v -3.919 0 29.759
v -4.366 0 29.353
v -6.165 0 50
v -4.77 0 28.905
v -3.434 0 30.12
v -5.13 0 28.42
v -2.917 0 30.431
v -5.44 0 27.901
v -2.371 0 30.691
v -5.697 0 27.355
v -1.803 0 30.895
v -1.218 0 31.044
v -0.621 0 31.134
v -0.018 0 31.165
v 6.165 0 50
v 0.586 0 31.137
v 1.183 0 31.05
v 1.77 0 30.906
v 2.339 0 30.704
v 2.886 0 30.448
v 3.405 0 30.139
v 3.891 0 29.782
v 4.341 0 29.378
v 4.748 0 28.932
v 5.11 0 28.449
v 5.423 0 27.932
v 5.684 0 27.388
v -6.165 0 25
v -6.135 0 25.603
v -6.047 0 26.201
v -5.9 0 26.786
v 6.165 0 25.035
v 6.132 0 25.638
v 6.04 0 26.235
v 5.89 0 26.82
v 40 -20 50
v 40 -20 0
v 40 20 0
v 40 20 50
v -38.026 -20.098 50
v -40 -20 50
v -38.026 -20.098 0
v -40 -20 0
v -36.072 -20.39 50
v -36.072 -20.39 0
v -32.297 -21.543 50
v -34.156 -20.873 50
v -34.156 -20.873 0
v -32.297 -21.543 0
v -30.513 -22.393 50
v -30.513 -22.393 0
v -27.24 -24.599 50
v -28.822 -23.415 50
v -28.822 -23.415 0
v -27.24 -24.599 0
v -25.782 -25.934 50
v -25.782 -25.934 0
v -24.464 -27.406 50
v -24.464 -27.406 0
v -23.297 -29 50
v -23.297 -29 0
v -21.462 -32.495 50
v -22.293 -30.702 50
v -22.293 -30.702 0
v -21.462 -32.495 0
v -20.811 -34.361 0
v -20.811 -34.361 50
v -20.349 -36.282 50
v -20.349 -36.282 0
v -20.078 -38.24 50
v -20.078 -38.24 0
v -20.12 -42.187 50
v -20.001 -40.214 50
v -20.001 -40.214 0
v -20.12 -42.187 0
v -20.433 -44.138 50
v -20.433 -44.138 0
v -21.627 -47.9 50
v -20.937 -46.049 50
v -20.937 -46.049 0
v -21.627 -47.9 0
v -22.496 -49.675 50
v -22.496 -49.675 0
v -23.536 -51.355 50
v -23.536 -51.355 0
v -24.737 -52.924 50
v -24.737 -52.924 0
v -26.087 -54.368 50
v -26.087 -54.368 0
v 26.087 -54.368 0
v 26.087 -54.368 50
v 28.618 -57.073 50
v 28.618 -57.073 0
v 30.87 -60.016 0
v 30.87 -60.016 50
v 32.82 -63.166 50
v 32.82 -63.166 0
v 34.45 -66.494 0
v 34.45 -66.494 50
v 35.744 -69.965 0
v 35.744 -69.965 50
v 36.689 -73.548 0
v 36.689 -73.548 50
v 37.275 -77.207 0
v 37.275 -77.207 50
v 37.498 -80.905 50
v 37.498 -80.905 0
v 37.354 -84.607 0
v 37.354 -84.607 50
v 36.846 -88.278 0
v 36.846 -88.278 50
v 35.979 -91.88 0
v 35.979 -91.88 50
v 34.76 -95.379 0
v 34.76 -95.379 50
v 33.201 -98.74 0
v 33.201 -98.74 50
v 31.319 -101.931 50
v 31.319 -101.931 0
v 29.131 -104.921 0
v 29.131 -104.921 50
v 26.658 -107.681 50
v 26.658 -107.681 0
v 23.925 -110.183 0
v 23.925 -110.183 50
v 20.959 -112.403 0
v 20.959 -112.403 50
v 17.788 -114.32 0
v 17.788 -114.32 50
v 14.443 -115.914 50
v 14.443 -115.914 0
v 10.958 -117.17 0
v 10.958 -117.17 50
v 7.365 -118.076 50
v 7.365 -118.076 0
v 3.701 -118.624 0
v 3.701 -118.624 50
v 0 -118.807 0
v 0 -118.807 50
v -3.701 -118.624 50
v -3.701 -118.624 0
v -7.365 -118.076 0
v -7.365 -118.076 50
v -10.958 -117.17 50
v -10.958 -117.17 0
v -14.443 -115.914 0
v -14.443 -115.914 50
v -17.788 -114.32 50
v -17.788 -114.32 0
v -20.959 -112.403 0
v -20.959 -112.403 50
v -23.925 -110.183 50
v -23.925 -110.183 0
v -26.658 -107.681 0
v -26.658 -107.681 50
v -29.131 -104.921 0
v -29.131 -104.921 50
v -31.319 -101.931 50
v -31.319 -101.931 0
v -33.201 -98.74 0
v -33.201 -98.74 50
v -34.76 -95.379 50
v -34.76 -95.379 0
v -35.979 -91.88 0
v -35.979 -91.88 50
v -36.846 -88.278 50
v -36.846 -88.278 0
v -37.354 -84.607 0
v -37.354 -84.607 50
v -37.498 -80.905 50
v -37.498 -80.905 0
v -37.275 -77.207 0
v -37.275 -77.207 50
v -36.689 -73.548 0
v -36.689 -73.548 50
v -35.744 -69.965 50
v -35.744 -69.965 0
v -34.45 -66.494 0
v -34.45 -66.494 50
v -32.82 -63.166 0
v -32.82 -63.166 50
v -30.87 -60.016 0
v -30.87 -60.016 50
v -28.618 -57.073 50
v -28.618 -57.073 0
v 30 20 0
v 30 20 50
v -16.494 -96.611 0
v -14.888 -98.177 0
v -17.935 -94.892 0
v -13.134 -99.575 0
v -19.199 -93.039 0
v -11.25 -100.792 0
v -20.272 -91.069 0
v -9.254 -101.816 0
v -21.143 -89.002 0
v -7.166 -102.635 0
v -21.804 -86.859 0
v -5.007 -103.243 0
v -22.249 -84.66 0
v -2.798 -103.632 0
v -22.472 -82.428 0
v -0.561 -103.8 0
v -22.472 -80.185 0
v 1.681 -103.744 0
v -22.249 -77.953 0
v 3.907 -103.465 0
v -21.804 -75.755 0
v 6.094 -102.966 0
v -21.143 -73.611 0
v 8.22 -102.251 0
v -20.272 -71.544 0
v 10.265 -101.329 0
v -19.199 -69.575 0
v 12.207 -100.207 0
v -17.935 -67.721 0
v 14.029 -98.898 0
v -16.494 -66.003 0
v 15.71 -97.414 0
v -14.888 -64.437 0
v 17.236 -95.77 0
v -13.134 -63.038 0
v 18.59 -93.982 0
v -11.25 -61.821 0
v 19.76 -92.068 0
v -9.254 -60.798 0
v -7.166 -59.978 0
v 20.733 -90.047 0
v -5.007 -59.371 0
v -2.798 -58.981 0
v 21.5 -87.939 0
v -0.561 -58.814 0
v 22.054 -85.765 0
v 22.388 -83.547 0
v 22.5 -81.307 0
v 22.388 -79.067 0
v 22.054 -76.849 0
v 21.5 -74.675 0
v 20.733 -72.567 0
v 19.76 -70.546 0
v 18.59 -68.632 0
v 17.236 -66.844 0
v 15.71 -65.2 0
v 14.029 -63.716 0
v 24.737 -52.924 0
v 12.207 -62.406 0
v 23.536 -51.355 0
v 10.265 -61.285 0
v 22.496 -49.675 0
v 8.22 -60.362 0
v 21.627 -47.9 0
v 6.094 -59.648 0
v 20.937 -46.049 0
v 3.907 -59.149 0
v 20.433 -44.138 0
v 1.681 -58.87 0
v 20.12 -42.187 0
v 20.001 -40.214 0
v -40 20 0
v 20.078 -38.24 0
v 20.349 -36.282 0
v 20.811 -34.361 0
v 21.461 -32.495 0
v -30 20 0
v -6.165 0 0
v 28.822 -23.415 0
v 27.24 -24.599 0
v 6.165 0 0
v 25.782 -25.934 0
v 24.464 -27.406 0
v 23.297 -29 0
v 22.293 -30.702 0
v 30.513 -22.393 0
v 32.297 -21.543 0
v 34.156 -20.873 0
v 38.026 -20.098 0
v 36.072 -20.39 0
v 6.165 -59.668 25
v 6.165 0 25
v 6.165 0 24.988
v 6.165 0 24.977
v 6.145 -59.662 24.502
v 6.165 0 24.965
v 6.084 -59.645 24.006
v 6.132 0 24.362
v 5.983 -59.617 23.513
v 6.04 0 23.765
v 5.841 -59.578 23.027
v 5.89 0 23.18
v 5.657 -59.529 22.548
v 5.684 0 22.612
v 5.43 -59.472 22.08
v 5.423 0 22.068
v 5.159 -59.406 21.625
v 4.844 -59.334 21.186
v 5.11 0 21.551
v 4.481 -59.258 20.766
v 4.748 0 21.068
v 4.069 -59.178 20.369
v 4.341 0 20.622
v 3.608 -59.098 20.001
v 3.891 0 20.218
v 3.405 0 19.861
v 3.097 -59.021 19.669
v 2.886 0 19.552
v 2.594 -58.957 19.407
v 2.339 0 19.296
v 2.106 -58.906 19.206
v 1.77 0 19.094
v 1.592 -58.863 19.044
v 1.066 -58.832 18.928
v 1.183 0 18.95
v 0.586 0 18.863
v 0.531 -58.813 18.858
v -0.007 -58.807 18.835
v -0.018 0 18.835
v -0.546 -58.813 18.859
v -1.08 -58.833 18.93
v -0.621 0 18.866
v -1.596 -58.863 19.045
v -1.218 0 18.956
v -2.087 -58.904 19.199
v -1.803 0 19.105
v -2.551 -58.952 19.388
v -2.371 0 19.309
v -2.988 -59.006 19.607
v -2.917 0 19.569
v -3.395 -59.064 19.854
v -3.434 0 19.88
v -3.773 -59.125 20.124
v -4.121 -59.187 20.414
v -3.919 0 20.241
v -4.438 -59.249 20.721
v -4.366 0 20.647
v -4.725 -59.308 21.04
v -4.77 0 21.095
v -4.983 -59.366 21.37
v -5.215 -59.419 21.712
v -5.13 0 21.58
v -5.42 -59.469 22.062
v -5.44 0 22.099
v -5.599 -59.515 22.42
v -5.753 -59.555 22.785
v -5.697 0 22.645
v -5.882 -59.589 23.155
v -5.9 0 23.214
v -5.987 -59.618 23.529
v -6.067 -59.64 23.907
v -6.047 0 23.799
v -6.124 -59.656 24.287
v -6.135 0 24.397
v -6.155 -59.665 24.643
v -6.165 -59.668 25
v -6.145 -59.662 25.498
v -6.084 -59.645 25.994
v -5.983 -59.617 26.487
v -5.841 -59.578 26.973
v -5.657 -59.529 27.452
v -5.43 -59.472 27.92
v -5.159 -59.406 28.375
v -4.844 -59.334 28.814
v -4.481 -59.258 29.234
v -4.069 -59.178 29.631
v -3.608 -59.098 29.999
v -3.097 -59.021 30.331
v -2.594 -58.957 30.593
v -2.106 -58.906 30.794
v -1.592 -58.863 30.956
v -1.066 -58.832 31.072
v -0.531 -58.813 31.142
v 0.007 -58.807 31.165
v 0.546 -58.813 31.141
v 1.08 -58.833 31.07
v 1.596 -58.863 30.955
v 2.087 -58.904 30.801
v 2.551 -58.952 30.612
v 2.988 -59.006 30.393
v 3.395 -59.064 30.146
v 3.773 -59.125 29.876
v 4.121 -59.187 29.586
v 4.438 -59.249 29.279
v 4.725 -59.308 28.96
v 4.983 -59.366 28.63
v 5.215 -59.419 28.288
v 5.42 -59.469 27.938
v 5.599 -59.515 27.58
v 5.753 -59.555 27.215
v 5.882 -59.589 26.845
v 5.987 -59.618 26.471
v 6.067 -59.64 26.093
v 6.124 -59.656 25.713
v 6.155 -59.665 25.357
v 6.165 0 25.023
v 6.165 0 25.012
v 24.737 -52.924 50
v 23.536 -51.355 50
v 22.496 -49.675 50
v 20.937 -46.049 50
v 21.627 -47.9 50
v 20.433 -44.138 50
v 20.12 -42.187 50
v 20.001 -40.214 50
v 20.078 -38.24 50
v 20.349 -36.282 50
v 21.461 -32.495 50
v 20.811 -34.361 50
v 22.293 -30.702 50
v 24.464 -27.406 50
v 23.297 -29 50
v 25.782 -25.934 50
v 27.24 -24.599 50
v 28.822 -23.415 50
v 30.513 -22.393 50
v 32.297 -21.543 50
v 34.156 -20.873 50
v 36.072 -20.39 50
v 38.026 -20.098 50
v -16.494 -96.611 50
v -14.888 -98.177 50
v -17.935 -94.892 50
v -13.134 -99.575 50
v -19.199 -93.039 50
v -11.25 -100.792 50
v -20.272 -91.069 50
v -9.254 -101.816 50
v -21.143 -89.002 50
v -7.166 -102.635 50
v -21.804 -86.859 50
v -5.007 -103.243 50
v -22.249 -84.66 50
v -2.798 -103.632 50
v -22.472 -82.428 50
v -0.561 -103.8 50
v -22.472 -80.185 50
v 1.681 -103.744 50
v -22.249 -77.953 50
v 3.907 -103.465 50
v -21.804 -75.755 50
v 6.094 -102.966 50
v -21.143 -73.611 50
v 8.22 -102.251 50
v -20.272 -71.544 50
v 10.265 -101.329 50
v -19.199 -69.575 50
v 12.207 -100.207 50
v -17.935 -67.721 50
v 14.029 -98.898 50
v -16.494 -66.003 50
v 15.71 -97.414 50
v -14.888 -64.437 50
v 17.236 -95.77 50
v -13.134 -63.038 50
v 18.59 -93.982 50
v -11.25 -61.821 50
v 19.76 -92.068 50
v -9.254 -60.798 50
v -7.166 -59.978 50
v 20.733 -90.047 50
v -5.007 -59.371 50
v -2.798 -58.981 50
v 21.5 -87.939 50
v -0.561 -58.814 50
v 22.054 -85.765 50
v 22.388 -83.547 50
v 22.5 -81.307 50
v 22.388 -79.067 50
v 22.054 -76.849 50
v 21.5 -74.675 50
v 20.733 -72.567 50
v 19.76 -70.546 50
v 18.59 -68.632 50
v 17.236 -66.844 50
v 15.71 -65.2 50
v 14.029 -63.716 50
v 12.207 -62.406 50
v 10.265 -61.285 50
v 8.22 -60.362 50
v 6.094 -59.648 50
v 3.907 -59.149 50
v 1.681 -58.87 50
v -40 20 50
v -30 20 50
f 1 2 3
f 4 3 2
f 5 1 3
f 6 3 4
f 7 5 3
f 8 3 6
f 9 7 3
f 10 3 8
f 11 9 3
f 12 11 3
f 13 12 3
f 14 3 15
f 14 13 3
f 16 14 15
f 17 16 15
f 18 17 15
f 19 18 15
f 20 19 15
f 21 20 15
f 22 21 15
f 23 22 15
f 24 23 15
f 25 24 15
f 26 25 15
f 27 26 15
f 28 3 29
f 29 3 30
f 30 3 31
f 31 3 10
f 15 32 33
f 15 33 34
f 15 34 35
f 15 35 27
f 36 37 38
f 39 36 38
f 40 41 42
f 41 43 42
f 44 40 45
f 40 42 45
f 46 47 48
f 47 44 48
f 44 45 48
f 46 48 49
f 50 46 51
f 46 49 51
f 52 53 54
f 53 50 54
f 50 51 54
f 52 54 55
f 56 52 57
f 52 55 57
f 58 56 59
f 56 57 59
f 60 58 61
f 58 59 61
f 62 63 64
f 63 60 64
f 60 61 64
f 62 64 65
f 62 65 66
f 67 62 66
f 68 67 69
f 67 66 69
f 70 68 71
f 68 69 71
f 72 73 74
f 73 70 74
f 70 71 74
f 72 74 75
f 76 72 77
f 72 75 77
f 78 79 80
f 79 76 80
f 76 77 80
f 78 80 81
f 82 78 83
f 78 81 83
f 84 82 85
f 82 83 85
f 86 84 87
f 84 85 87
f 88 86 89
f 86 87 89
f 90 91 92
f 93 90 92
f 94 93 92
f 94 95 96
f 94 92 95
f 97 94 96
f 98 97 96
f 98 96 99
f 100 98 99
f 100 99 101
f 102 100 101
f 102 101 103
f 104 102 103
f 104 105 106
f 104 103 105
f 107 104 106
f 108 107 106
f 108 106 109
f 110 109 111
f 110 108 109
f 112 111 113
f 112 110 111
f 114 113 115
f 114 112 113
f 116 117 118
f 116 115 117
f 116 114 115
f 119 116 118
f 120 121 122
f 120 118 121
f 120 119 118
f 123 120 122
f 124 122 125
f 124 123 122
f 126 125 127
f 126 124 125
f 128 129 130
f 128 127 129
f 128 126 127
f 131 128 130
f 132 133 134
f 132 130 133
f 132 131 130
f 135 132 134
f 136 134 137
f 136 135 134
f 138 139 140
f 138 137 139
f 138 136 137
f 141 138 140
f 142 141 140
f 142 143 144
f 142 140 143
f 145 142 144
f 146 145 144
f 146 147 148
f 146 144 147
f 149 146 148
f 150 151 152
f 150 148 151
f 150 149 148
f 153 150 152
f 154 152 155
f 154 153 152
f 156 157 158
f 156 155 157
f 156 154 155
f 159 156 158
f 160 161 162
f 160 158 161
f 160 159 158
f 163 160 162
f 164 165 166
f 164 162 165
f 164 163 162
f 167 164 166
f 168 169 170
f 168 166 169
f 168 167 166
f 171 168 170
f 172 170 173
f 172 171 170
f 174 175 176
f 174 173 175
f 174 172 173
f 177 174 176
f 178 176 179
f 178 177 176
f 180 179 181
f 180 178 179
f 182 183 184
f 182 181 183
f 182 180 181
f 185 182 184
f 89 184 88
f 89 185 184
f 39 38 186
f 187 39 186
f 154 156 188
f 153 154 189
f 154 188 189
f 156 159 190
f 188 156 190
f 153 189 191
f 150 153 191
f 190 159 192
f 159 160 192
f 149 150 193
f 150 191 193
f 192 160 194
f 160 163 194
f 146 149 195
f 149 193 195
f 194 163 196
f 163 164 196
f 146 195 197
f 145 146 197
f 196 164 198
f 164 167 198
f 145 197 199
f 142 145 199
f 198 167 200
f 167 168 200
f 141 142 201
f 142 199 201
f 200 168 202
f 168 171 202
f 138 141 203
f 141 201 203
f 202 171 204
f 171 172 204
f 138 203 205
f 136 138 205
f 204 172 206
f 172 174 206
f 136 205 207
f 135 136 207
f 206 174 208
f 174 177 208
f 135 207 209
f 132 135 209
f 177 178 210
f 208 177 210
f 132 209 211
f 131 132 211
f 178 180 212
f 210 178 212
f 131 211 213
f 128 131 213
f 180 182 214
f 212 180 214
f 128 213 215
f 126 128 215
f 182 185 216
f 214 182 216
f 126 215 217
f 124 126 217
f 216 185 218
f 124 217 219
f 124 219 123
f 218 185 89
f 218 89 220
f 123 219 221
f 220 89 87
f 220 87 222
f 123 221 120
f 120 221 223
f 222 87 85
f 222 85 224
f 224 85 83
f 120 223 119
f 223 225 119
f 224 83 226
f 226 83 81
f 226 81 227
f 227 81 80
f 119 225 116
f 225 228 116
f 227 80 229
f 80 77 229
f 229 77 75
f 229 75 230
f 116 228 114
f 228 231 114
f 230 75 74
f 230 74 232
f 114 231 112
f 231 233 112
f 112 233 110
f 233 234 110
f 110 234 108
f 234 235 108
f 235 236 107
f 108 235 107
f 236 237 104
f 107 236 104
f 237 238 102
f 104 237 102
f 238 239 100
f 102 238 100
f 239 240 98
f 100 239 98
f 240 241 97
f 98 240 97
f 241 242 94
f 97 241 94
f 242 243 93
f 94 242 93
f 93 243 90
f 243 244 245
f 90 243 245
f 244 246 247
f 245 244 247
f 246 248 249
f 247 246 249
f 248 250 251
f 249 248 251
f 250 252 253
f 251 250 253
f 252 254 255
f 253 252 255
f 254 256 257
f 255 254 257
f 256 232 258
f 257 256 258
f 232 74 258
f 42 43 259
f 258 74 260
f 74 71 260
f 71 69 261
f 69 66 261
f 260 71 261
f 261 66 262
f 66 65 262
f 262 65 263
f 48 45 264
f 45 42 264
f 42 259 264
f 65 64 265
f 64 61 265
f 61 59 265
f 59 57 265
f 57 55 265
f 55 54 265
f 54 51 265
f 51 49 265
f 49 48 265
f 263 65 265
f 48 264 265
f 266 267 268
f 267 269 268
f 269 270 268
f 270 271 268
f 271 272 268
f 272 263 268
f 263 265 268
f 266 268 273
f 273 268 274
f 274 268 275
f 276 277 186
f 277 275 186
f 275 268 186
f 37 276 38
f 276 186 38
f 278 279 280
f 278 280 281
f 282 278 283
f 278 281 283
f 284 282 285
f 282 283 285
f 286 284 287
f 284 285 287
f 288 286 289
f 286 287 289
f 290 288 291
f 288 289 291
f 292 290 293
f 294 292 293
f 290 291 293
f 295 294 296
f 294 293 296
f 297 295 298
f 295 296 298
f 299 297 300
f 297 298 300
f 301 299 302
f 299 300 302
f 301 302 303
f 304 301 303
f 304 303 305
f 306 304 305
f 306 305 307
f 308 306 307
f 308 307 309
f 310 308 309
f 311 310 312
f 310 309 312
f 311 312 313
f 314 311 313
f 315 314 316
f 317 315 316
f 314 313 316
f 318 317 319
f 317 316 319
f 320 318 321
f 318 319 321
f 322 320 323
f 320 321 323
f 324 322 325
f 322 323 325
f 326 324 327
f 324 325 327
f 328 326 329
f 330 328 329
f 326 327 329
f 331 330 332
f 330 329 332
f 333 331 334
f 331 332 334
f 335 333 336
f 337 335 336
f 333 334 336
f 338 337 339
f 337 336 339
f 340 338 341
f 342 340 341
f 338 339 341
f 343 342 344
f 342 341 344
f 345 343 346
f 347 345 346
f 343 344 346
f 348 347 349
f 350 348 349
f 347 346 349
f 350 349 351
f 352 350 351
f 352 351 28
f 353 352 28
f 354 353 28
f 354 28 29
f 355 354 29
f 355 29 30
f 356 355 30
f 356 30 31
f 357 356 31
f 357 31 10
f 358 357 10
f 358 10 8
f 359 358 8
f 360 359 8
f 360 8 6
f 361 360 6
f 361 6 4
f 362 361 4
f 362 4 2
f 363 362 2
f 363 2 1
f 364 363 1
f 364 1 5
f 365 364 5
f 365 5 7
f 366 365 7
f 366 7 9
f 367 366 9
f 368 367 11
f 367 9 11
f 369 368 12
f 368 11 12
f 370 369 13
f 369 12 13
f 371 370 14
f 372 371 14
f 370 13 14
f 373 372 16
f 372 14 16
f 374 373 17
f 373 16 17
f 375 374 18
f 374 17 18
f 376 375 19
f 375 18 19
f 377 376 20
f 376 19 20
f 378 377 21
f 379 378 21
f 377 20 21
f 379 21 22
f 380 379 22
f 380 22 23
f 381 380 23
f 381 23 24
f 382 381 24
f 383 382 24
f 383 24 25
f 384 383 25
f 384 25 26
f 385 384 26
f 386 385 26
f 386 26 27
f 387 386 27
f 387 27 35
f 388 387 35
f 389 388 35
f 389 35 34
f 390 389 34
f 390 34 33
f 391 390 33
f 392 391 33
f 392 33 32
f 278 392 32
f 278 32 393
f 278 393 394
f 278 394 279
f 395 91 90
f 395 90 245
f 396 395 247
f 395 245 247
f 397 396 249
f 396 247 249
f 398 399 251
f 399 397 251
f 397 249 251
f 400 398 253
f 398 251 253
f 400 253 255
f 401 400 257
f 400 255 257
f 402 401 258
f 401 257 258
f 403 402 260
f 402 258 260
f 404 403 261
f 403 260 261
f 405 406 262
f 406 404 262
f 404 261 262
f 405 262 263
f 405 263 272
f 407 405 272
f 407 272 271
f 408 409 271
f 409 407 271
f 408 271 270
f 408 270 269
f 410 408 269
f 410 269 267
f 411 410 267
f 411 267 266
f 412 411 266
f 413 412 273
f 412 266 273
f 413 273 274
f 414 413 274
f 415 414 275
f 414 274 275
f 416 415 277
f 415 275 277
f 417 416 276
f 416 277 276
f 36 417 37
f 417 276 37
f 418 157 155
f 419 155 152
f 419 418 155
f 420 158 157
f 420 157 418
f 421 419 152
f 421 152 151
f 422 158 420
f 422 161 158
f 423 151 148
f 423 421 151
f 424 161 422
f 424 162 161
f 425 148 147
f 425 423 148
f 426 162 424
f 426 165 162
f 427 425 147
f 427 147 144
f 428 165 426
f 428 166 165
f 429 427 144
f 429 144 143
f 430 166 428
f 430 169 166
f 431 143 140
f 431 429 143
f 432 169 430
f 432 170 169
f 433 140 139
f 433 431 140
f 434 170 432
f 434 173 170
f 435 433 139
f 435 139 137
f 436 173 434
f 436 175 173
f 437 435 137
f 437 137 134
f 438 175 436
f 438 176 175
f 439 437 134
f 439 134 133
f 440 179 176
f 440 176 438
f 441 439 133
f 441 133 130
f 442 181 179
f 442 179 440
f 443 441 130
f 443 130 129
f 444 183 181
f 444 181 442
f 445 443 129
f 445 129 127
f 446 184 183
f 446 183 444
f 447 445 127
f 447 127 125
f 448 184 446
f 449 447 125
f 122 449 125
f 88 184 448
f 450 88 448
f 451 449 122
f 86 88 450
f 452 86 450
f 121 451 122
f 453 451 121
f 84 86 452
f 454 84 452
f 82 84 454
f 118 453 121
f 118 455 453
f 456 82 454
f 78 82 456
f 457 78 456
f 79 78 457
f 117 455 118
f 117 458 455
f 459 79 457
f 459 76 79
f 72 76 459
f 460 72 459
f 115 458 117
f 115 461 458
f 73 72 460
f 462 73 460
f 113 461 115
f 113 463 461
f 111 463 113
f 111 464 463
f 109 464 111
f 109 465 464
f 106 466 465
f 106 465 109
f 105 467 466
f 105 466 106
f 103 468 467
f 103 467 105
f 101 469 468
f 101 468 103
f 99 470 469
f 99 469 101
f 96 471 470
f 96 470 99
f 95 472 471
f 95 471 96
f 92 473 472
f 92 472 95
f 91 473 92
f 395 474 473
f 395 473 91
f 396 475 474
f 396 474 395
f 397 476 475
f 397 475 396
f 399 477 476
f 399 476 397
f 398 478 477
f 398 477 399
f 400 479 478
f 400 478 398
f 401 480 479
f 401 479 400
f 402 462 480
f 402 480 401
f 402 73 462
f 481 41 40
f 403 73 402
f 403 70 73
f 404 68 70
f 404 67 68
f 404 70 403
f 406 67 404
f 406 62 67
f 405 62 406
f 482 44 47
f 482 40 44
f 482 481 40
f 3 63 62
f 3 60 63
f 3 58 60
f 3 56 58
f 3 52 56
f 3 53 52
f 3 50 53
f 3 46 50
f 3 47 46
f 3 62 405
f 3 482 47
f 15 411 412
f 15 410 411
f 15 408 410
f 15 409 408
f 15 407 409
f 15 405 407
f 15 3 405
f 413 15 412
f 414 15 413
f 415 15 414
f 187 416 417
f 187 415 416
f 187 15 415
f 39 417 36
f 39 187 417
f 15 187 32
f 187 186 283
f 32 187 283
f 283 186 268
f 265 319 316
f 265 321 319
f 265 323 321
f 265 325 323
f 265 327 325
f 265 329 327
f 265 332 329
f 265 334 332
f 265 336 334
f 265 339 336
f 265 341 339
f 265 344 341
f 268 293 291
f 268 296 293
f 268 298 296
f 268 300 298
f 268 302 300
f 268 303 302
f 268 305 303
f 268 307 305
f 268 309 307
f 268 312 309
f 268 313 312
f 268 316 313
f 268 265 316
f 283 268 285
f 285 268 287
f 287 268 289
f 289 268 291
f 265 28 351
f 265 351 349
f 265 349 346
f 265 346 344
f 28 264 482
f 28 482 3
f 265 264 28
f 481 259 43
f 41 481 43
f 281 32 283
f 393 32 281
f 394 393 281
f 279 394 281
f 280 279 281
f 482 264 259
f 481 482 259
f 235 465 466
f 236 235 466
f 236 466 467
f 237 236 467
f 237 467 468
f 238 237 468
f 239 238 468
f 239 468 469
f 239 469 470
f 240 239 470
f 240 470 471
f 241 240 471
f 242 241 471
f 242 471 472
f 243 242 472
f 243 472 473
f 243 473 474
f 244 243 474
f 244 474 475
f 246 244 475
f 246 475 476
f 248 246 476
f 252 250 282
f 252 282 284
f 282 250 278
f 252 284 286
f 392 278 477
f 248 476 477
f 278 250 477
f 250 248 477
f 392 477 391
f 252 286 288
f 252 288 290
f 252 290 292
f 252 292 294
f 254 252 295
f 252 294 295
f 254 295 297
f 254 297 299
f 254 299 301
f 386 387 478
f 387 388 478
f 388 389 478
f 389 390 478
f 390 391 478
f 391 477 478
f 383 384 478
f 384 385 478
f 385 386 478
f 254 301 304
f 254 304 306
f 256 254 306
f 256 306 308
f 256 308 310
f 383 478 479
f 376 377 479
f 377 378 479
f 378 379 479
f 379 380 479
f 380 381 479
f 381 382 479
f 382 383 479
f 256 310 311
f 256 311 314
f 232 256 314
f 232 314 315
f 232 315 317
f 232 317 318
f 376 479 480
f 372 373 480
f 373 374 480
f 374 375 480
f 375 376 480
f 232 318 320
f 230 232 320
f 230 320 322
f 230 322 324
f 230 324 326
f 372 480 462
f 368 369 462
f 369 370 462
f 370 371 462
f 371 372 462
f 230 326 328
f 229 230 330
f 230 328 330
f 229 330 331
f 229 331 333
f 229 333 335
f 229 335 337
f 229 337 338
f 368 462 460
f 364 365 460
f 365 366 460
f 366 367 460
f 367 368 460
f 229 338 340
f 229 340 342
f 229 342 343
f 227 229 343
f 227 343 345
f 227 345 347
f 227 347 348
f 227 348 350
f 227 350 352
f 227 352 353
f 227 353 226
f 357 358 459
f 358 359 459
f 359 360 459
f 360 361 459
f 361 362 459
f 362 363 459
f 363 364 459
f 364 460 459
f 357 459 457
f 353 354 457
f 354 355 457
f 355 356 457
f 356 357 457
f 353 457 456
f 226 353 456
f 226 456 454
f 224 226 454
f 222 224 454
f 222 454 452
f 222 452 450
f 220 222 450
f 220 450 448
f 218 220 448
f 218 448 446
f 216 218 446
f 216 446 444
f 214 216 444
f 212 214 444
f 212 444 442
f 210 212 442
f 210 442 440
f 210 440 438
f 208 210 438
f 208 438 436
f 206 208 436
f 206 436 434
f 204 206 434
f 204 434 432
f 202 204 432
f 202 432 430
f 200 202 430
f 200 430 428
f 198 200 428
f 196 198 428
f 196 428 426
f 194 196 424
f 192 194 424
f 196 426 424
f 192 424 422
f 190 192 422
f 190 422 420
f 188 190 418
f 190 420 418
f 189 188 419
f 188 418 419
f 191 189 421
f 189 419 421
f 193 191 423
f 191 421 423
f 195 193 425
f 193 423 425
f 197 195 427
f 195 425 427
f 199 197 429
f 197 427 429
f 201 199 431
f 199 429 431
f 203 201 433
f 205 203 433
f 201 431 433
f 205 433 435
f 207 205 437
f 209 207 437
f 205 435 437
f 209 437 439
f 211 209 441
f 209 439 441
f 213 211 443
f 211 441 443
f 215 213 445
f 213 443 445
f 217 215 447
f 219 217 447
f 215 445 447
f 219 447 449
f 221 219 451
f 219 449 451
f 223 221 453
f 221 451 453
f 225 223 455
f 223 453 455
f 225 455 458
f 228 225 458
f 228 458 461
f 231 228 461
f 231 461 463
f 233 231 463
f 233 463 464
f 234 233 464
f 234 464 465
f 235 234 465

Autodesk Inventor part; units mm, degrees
ref_plane "YZ Plane" through (0, 0, 0) normal (1, 0, 0) x (0, 1, 0)
ref_plane "XZ Plane" through (0, 0, 0) normal (0, 1, 0) x (-1, 0, 0)
ref_plane "XY Plane" through (0, 0, 0) normal (0, 0, 1) x (1, 0, 0)
sketch "Sketch1" plane through (0, 0, 0) normal (0, 0, 1) x (1, 0, 0)
  line L0 (-257.8464, 52.4999) -> (-100.2151, 52.4999) construction
  line L1 (-100.2151, 52.4999) -> (-100.2151, -56.2898) construction
  line L2 (-100.2151, -56.2898) -> (-257.8464, -56.2898) construction
  line L3 (-257.8464, -56.2898) -> (-257.8464, 52.4999) construction
  line L4 (40, -20) -> (40, 20)
  line L5 (-40, 20) -> (-40, -20)
  line L6 (-6.1649, 0) -> (6.1649, 0)
  line L7 (-30, 20) -> (-6.1649, 0)
  line L8 (30, 20) -> (6.1649, 0)
  line L9 (40, 20) -> (30, 20)
  line L10 (-30, 20) -> (-40, 20)
  arc A0 (-26.087, -54.3676) -> (26.087, -54.3676) centre (0, -81.3068) ccw
  arc A1 (-26.087, -54.3676) -> (-40, -20) centre (-40, -40) ccw
  arc A2 (40, -20) -> (26.087, -54.3676) centre (40, -40) ccw
  point P0 (0, 0)
  point P1 (-24.7924, -52.9895)
  point P2 (24.7924, -52.9895)
  dimension "d7" = 80
  dimension "d8" = 40
  dimension "d9" = 10
  dimension "d10" = 10
  dimension "d16" = 75
  dimension "d17" = 20
extrude "Extrusion1" add sketch "Sketch1" along normal blind 50
sketch "Sketch2" plane through (0, 0, 50) normal (0, 0, 1) x (1, 0, 0)
  arc A0 (-26.087, -54.3676) -> (26.087, -54.3676) centre (0, -81.3068) ccw projected
  circle A1 centre (0, -81.3068) radius 22.5
  point P0 (0, 0)
  dimension "d23" = 45
extrude "Extrusion2" cut sketch "Sketch2" against normal through all
sketch "Sketch3" plane through (-6.1649, 0, 0) normal (0, 1, 0) x (1, 0, 0)
  line L0 (12.3299, -50) -> (0, -50) projected
  line L1 (0, 0) -> (0, -50) projected
  line L2 (12.3299, 0) -> (12.3299, -50) projected
  circle A0 centre (6.1649, -25) radius 6.165
  point P0 (6.1649, 0)
  point P1 (12.3299, -24.9702)
  point P2 (0, -24.9702)
  point P3 (0, -25.0298)
  point P4 (12.3299, -25.0298)
  dimension "d26" = 12.3299
  dimension "d27" = 12.33
extrude "Extrusion3" cut sketch "Sketch3" against normal blind 60 contours A0
properties part number "cad@39"
